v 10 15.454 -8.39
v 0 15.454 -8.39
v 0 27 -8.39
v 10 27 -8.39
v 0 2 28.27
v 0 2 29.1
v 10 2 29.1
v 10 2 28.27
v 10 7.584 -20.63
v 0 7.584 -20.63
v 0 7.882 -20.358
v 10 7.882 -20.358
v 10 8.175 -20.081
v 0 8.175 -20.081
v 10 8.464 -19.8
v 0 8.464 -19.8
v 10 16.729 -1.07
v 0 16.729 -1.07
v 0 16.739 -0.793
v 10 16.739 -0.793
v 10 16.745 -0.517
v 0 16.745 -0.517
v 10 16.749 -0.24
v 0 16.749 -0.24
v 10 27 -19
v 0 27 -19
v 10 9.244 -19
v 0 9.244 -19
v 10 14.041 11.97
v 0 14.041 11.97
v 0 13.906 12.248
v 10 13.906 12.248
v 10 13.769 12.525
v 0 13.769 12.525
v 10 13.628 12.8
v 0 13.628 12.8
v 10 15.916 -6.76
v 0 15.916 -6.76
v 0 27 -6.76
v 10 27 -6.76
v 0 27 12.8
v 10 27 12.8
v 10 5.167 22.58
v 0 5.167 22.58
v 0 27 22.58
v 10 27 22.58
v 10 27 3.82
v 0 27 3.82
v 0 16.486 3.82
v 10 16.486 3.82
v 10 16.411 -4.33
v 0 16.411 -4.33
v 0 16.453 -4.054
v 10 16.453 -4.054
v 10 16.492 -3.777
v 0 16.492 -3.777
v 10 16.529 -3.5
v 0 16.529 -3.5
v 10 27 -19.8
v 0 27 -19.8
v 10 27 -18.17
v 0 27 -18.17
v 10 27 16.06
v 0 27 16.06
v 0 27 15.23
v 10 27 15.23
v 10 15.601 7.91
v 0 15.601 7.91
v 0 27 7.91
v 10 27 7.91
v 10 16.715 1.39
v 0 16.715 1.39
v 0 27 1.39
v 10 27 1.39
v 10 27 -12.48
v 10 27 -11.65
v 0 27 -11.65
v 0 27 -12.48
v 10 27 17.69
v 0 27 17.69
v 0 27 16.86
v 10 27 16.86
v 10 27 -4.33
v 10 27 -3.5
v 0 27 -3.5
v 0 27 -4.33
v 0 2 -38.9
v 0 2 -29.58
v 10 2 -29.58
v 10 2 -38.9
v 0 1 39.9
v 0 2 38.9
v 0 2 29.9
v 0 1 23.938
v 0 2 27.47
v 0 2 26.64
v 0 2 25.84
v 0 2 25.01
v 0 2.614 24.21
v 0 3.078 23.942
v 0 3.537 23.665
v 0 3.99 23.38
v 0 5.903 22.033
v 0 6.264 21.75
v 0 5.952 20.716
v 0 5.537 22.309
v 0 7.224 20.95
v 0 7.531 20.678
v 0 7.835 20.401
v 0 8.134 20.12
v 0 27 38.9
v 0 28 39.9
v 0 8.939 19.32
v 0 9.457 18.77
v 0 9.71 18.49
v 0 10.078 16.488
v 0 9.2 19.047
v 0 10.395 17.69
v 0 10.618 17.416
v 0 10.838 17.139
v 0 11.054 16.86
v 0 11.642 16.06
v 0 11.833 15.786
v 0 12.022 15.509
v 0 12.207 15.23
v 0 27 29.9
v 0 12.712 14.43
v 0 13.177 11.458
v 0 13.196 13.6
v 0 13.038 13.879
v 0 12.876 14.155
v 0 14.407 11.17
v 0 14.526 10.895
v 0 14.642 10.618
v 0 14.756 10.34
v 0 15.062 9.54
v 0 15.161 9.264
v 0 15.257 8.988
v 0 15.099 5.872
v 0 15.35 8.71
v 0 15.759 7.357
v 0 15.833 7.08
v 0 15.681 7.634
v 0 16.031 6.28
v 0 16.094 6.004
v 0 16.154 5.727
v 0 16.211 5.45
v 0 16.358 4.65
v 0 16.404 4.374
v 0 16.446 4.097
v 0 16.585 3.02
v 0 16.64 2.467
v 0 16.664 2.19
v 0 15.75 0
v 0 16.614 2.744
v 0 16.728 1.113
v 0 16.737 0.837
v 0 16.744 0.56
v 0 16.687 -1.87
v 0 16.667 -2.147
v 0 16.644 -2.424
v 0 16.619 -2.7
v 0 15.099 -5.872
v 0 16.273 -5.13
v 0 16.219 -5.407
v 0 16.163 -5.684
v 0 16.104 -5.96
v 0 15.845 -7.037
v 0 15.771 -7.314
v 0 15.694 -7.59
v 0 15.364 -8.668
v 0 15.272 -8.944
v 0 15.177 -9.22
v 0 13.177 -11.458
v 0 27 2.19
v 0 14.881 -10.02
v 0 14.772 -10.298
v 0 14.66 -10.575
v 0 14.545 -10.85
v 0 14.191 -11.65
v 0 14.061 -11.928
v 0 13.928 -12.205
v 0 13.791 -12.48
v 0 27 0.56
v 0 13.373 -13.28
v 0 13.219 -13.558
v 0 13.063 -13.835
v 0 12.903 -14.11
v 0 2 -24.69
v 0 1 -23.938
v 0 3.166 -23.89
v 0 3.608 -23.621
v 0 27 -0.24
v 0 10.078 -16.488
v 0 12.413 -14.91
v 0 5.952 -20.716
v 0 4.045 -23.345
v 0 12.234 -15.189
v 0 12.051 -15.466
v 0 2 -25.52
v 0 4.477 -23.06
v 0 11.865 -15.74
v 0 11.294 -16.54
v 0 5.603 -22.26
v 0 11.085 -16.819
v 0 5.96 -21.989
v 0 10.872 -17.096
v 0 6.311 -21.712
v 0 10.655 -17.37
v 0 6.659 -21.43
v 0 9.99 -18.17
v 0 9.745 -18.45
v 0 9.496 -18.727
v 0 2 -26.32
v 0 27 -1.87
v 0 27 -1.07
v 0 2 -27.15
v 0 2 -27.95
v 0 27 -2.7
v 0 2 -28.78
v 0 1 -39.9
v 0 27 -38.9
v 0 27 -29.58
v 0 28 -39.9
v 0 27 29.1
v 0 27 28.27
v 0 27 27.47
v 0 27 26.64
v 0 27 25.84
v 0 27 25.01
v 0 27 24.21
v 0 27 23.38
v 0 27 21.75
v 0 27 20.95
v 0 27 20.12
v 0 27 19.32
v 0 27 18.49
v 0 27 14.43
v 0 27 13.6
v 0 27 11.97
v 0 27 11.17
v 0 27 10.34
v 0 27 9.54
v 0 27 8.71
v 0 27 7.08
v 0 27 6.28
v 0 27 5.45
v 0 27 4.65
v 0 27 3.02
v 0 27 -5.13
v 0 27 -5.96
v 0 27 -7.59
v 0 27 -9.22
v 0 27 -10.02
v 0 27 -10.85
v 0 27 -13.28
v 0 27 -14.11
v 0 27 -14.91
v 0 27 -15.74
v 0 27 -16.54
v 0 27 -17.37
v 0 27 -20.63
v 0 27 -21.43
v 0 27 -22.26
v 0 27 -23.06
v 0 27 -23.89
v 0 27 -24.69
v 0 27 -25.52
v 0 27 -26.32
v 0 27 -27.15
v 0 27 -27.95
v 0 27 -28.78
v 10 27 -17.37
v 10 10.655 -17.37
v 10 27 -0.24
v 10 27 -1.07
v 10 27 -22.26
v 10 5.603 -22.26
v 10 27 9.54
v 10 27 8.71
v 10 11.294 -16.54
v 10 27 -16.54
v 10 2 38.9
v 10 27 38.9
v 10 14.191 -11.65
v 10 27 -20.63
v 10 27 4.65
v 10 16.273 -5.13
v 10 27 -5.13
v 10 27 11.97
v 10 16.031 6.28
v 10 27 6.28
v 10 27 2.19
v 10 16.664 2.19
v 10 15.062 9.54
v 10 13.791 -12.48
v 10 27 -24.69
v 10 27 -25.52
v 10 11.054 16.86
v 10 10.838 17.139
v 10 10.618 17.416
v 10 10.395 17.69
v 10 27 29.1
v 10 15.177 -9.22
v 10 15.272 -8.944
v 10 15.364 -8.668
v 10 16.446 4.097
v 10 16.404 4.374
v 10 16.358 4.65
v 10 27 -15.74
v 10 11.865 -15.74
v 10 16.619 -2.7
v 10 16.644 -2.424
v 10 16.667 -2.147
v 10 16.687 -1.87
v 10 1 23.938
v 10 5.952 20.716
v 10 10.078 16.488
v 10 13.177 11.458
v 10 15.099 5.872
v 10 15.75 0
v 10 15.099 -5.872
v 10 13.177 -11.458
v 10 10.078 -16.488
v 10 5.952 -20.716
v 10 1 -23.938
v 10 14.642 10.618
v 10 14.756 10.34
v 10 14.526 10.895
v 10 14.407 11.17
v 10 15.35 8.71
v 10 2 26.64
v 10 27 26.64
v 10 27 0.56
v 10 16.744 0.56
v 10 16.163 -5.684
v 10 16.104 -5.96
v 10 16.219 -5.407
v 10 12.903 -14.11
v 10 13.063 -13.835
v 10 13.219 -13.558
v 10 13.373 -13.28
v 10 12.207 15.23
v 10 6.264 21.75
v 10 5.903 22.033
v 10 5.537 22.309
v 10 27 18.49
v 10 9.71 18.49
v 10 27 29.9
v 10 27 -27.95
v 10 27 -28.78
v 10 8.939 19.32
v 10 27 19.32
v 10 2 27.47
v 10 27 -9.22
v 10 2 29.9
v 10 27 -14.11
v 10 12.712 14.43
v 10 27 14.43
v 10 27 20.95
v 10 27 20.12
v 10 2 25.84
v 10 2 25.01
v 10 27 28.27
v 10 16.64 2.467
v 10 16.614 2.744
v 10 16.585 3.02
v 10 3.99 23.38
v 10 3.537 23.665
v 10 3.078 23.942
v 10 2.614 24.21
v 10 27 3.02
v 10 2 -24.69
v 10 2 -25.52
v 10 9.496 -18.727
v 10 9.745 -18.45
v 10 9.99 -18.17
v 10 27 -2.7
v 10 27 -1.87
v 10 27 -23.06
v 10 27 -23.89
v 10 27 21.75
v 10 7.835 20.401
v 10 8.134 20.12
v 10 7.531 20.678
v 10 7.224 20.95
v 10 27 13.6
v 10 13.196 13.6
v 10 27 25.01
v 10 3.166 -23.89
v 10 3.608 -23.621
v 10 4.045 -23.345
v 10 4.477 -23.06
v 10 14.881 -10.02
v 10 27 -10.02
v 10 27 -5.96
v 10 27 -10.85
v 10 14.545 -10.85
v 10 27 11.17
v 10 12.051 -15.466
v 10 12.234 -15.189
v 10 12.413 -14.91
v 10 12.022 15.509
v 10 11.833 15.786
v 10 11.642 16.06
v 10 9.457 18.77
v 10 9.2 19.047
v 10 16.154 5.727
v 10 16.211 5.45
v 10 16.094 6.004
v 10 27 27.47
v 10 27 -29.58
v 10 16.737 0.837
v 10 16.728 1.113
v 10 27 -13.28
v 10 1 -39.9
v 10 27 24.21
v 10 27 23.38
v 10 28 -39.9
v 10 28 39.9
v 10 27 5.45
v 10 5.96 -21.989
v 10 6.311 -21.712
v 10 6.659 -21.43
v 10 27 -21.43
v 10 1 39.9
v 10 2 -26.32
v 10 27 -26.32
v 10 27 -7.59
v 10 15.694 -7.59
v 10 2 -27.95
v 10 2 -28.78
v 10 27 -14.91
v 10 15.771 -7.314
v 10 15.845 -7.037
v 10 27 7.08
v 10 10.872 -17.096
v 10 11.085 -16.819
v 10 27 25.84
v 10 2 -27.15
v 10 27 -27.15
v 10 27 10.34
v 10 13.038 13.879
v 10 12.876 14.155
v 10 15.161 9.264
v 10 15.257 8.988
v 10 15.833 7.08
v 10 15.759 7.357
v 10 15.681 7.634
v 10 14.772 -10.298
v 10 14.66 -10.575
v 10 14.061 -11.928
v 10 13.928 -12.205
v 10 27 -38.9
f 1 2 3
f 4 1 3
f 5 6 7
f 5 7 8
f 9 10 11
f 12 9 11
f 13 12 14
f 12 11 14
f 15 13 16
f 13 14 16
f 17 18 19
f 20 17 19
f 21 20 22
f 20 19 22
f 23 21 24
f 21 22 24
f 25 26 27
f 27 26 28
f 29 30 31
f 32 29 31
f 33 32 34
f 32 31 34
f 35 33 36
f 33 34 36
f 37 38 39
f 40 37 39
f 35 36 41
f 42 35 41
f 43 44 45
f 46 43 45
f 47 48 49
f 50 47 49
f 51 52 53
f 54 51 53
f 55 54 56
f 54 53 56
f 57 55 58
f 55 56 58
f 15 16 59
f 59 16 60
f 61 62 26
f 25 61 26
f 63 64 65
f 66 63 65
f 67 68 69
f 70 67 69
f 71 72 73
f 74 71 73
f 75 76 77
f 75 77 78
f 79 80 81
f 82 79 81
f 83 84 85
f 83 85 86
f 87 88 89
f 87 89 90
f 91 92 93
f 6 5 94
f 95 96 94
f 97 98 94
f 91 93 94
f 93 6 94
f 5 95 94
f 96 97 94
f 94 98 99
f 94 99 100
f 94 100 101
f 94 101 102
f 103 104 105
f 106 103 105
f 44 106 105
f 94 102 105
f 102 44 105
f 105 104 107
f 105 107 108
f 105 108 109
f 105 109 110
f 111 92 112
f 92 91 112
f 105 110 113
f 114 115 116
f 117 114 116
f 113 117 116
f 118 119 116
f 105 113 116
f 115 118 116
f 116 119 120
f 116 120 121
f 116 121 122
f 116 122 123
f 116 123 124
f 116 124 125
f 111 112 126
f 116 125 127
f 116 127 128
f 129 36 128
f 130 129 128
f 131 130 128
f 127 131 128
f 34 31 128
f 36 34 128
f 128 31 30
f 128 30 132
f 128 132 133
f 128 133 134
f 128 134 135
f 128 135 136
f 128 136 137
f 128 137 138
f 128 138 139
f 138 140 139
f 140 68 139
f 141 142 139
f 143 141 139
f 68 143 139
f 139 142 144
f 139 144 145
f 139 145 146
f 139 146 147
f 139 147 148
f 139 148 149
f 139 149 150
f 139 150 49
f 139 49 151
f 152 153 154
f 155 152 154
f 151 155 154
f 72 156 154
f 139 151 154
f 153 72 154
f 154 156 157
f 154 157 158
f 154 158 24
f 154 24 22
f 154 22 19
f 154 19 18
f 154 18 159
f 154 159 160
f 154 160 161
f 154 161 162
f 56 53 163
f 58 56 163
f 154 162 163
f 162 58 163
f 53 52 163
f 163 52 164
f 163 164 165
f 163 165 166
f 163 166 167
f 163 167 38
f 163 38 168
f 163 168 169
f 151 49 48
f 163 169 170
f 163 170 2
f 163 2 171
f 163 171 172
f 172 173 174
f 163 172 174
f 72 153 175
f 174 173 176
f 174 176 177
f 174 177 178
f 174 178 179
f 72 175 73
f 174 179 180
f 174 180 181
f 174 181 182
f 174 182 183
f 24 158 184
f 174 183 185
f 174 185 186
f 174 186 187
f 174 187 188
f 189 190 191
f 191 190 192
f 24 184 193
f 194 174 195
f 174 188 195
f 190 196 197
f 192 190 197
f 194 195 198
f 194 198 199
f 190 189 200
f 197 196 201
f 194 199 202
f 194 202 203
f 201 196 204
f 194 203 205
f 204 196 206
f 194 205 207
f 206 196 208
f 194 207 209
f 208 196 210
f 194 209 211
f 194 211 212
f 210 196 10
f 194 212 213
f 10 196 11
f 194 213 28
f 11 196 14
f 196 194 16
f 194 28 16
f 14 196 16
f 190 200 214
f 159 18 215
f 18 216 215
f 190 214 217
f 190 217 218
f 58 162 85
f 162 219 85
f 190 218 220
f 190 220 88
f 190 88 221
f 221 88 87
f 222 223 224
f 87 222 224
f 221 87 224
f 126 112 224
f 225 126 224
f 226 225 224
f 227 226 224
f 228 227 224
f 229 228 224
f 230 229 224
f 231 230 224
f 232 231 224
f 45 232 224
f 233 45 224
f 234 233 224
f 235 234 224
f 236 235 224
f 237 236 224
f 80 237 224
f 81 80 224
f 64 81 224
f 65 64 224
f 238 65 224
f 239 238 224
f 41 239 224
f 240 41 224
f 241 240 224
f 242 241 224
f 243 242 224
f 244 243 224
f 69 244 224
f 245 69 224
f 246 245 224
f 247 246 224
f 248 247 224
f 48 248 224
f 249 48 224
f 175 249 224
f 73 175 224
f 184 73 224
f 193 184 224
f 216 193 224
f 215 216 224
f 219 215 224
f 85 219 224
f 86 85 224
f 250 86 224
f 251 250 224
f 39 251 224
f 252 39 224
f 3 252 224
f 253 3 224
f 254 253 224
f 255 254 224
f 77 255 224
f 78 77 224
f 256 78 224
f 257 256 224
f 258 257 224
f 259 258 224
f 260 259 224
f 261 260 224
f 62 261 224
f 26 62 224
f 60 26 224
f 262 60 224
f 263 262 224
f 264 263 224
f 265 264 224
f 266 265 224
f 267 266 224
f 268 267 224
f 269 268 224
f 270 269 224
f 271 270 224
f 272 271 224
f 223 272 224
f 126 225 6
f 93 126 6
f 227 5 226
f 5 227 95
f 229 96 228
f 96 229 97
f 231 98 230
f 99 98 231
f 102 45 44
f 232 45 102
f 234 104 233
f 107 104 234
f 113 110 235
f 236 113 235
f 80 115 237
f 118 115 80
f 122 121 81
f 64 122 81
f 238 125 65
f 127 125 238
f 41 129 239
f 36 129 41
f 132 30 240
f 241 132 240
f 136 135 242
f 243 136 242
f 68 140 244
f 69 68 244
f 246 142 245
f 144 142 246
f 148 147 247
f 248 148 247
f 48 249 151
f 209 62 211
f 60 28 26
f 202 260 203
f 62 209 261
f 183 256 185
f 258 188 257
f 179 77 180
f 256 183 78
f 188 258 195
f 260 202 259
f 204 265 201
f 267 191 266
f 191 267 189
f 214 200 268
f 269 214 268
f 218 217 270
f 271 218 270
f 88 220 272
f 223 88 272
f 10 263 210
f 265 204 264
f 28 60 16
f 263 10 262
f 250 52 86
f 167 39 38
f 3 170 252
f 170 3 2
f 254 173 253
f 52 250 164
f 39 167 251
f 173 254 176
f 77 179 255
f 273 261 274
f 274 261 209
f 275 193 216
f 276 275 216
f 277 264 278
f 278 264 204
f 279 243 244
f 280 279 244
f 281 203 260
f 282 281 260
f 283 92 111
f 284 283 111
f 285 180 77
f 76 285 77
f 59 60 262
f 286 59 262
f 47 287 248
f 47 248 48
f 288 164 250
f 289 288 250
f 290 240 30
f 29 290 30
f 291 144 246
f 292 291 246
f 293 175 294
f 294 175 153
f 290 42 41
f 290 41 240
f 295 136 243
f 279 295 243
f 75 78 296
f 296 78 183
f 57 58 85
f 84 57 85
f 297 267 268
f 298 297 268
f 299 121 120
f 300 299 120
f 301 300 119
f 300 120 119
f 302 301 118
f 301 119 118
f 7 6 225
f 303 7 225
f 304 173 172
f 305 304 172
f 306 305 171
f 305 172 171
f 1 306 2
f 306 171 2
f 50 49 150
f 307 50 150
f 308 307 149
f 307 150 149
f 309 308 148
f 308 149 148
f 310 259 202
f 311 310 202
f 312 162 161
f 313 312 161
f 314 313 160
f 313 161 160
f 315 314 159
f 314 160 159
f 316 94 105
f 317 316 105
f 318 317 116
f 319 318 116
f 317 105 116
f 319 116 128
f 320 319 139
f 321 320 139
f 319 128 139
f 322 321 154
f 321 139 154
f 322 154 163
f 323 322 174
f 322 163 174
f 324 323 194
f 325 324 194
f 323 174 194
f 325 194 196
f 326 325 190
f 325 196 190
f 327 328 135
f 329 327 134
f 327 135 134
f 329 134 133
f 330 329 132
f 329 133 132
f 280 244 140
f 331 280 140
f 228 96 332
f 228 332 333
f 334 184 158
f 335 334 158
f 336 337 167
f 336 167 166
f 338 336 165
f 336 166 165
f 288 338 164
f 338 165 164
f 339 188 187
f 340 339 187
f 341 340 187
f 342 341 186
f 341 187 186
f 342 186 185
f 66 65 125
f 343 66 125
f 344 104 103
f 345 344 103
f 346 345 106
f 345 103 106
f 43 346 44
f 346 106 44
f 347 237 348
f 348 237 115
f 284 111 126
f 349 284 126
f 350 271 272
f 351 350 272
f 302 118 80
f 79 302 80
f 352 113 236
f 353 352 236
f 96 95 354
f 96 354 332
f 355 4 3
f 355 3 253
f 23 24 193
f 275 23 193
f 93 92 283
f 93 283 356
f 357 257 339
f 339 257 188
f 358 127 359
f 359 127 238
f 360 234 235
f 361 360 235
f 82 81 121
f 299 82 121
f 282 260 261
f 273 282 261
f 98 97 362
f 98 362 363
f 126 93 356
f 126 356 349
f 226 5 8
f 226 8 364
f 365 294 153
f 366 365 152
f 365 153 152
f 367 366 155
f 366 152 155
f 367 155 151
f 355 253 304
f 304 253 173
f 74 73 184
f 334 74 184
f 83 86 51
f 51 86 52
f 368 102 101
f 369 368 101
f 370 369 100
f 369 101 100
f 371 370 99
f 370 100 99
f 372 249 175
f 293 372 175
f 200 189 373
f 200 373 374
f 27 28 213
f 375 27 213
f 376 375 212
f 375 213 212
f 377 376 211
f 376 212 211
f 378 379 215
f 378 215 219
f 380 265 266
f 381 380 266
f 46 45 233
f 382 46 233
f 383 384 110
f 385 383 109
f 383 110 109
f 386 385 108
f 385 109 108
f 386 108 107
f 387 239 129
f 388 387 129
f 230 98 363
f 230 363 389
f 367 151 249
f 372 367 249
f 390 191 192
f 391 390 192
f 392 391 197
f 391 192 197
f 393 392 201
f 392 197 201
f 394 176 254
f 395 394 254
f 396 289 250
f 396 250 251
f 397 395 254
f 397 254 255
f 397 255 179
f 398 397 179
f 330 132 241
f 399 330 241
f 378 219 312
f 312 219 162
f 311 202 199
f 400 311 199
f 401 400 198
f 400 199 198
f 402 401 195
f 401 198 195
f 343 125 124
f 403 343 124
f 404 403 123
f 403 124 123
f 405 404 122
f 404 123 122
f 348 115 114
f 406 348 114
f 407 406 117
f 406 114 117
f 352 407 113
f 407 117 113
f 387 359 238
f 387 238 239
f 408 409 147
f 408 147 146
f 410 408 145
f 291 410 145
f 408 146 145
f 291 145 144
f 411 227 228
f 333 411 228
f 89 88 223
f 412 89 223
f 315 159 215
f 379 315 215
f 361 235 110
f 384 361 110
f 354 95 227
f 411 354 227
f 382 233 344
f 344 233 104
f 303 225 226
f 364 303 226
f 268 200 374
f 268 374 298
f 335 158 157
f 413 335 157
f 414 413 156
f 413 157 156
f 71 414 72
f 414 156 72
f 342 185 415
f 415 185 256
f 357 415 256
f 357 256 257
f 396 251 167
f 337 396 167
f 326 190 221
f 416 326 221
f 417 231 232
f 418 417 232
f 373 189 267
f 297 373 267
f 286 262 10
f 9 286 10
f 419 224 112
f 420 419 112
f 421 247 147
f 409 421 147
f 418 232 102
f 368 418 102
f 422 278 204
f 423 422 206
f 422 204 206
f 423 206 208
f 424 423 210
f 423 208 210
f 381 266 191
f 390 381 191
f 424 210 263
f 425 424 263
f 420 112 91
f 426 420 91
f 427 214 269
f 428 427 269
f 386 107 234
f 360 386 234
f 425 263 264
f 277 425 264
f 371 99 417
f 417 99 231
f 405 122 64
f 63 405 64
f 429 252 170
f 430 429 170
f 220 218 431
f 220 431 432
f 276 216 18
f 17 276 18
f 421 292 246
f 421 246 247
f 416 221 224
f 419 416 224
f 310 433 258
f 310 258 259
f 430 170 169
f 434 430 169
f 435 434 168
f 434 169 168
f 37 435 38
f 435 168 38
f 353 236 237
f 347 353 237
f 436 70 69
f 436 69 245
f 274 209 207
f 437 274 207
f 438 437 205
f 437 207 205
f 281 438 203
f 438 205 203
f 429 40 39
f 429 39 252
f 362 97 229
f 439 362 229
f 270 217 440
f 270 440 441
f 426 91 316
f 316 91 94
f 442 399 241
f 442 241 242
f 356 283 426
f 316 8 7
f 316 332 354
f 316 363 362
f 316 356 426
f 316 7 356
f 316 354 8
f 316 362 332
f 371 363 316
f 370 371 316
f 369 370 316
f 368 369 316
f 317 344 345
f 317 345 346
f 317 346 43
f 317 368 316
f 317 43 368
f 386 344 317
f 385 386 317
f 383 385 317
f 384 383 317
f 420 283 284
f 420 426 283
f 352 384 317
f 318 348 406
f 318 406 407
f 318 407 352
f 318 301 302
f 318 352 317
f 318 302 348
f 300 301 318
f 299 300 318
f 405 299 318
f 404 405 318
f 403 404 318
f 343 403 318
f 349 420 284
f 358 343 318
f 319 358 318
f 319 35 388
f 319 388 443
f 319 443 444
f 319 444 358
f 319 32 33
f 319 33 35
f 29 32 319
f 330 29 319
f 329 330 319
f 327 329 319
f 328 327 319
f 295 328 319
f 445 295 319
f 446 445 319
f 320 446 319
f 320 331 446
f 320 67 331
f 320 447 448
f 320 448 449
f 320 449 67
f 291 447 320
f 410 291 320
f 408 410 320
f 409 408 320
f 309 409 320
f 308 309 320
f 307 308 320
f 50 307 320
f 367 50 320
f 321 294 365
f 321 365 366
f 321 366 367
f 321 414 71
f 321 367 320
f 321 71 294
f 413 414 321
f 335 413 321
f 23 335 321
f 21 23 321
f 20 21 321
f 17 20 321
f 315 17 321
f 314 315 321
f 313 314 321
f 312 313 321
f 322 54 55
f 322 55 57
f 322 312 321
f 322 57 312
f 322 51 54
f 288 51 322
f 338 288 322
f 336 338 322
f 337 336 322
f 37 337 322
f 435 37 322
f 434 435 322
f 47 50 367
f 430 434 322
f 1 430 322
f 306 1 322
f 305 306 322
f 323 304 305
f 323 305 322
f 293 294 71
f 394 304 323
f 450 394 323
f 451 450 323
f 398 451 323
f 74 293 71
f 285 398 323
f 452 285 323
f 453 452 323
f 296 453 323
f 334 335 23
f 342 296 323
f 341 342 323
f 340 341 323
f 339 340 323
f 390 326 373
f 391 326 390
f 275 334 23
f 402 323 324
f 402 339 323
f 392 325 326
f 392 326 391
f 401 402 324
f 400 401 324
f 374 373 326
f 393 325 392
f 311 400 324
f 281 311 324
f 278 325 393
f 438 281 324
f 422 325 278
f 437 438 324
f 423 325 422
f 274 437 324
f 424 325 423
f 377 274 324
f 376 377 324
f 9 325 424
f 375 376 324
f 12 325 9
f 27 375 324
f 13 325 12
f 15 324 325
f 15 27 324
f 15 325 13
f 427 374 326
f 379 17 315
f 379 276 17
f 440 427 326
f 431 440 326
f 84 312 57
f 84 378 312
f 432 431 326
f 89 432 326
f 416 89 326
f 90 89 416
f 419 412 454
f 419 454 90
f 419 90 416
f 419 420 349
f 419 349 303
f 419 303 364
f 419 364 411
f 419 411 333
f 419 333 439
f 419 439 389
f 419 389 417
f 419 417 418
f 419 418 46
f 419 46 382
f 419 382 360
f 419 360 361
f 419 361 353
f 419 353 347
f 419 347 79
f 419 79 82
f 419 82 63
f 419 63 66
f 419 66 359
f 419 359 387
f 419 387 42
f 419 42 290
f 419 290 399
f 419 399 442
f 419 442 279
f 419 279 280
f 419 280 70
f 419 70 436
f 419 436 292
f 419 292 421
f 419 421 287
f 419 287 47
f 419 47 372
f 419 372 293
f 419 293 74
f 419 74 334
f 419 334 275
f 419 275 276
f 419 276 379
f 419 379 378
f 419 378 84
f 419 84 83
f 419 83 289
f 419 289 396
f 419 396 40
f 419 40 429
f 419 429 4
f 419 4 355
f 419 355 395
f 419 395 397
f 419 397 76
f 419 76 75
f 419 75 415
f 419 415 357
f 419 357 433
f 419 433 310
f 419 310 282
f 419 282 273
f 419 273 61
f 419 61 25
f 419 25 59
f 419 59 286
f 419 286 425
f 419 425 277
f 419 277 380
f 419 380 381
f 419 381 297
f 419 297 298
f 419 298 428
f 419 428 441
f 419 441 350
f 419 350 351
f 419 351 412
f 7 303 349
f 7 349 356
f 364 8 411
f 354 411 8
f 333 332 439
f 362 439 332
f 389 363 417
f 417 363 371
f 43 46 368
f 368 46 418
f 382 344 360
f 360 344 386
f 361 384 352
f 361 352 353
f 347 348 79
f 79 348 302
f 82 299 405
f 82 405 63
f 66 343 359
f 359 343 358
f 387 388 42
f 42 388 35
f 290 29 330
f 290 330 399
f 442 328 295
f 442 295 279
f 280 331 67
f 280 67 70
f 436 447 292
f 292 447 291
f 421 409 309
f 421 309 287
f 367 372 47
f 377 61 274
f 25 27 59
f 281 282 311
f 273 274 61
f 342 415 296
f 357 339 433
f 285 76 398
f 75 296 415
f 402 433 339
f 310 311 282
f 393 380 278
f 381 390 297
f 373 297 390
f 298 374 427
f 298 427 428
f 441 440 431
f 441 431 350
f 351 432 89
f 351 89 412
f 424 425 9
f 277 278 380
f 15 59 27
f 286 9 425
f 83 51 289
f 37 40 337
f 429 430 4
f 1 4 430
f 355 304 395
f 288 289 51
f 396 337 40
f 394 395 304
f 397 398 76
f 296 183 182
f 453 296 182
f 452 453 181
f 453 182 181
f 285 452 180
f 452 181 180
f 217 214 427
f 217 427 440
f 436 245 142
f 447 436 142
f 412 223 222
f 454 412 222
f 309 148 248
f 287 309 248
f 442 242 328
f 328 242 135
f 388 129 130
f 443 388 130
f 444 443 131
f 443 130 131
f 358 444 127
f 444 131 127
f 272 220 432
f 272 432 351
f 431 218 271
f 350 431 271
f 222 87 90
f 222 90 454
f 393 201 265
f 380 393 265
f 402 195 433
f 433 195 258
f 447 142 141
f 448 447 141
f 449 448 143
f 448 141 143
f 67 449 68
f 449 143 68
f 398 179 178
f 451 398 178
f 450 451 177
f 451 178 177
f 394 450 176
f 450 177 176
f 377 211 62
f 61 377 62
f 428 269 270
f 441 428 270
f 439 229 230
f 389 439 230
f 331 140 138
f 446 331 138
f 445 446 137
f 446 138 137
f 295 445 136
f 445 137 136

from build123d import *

# Parameters (mm, degrees)
SKETCH1_W           = 9
SKETCH1_H           = 25
SKETCH1_W_2         = 0.83
SKETCH1_W_3         = 9.32
BOSS_EXTRUDE1_DEPTH = 10


with BuildPart() as part:
    # Sketch1 → Boss-Extrude1 (new body)
    with BuildSketch(Plane(origin=(0, 0, 0), x_dir=(0, 0, -1), z_dir=(1, 0, 0))):
        with BuildLine():
            Line((23.938201687, 1), (39.9, 1))
            Line((39.9, 1), (39.9, 28))
            Line((39.9, 28), (-39.9, 28))
            Line((-39.9, 28), (-39.9, 1))
            Line((-39.9, 1), (-23.938201687, 1))
            ThreePointArc((-23.938201687, 1), (0, 15.75), (23.938201687, 1))
        make_face()
        with Locations((-34.4, 14.5)):
            Rectangle(SKETCH1_W, SKETCH1_H, mode=Mode.SUBTRACT)
        with Locations((-28.685, 14.5)):
            Rectangle(SKETCH1_W_2, SKETCH1_H, mode=Mode.SUBTRACT)
        with Locations((-27.055, 14.5)):
            Rectangle(SKETCH1_W_2, SKETCH1_H, mode=Mode.SUBTRACT)
        with Locations((-25.425, 14.5)):
            Rectangle(SKETCH1_W_2, SKETCH1_H, mode=Mode.SUBTRACT)
        with BuildLine():
            Line((-24.21, 27), (-23.38, 27))
            Line((-23.38, 27), (-23.38, 3.990465418))
            ThreePointArc((-23.38, 3.990465418), (-23.80494512, 3.308432638), (-24.21, 2.614402658))
            Line((-24.21, 2.614402658), (-24.21, 27))
        make_face(mode=Mode.SUBTRACT)
        with BuildLine():
            Line((-22.58, 27), (-21.75, 27))
            Line((-21.75, 27), (-21.75, 6.264083863))
            ThreePointArc((-21.75, 6.264083863), (-22.171789507, 5.720562008), (-22.58, 5.166769099))
            Line((-22.58, 5.166769099), (-22.58, 27))
        make_face(mode=Mode.SUBTRACT)
        with BuildLine():
            Line((-20.95, 27), (-20.12, 27))
            Line((-20.12, 27), (-20.12, 8.133993328))
            ThreePointArc((-20.12, 8.133993328), (-20.540040569, 7.683572361), (-20.95, 7.223956879))
            Line((-20.95, 7.223956879), (-20.95, 27))
        make_face(mode=Mode.SUBTRACT)
        with BuildLine():
            Line((-19.32, 27), (-18.49, 27))
            Line((-18.49, 27), (-18.49, 9.709573695))
            ThreePointArc((-18.49, 9.709573695), (-18.908921242, 9.328731498), (-19.32, 8.939437211))
            Line((-19.32, 8.939437211), (-19.32, 27))
        make_face(mode=Mode.SUBTRACT)
        with BuildLine():
            Line((-17.69, 27), (-16.86, 27))
            Line((-16.86, 27), (-16.86, 11.053854867))
            ThreePointArc((-16.86, 11.053854867), (-17.278137213, 10.72856686), (-17.69, 10.39537013))
            Line((-17.69, 10.39537013), (-17.69, 27))
        make_face(mode=Mode.SUBTRACT)
        with BuildLine():
            Line((-16.06, 27), (-15.23, 27))
            Line((-15.23, 27), (-15.23, 12.206979598))
            ThreePointArc((-15.23, 12.206979598), (-15.647552225, 11.928122407), (-16.06, 11.641769433))
            Line((-16.06, 11.641769433), (-16.06, 27))
        make_face(mode=Mode.SUBTRACT)
        with BuildLine():
            Line((-14.43, 27), (-13.6, 27))
            Line((-13.6, 27), (-13.6, 13.196236821))
            ThreePointArc((-13.6, 13.196236821), (-14.017094411, 12.957520994), (-14.43, 12.711630836))
            Line((-14.43, 12.711630836), (-14.43, 27))
        make_face(mode=Mode.SUBTRACT)
        with BuildLine():
            Line((-12.8, 27), (-11.97, 27))
            Line((-11.97, 27), (-11.97, 14.041016321))
            ThreePointArc((-11.97, 14.041016321), (-12.386722167, 13.83793109), (-12.8, 13.627925359))
            Line((-12.8, 13.627925359), (-12.8, 27))
        make_face(mode=Mode.SUBTRACT)
        with BuildLine():
            Line((-11.17, 27), (-10.34, 27))
            Line((-10.34, 27), (-10.34, 14.755511039))
            ThreePointArc((-10.34, 14.755511039), (-10.756409627, 14.584735262), (-11.17, 14.40724062))
            Line((-11.17, 14.40724062), (-11.17, 27))
        make_face(mode=Mode.SUBTRACT)
        with BuildLine():
            Line((-9.54, 27), (-8.71, 27))
            Line((-8.71, 27), (-8.71, 15.350301135))
            ThreePointArc((-8.71, 15.350301135), (-9.126139757, 15.209352108), (-9.54, 15.061844056))
            Line((-9.54, 15.061844056), (-9.54, 27))
        make_face(mode=Mode.SUBTRACT)
        with BuildLine():
            Line((-7.91, 27), (-7.08, 27))
            Line((-7.08, 27), (-7.08, 15.833333127))
            ThreePointArc((-7.08, 15.833333127), (-7.495900758, 15.720346875), (-7.91, 15.600926813))
            Line((-7.91, 15.600926813), (-7.91, 27))
        make_face(mode=Mode.SUBTRACT)
        with BuildLine():
            Line((-6.28, 27), (-5.45, 27))
            Line((-5.45, 27), (-5.45, 16.210548417))
            ThreePointArc((-5.45, 16.210548417), (-5.865684067, 16.124137529), (-6.28, 16.031388443))
            Line((-6.28, 16.031388443), (-6.28, 27))
        make_face(mode=Mode.SUBTRACT)
        with BuildLine():
            Line((-4.65, 27), (-3.82, 27))
            Line((-3.82, 27), (-3.82, 16.486296047))
            ThreePointArc((-3.82, 16.486296047), (-4.235483175, 16.425455998), (-4.65, 16.358347269))
            Line((-4.65, 16.358347269), (-4.65, 27))
        make_face(mode=Mode.SUBTRACT)
        with BuildLine():
            Line((-3.02, 27), (-2.19, 27))
            Line((-2.19, 27), (-2.19, 16.663604962))
            ThreePointArc((-2.19, 16.663604962), (-2.605292879, 16.62765252), (-3.02, 16.585477199))
            Line((-3.02, 16.585477199), (-3.02, 27))
        make_face(mode=Mode.SUBTRACT)
        with BuildLine():
            Line((-1.39, 27), (-0.56, 27))
            Line((-0.56, 27), (-0.56, 16.74435914))
            ThreePointArc((-0.56, 16.74435914), (-0.97510879, 16.732893349), (-1.39, 16.715228254))
            Line((-1.39, 16.715228254), (-1.39, 27))
        make_face(mode=Mode.SUBTRACT)
        with BuildLine():
            Line((0.24, 27), (1.07, 27))
            Line((1.07, 27), (1.07, 16.729400641))
            ThreePointArc((1.07, 16.729400641), (0.655073035, 16.74228093), (0.24, 16.748964009))
            Line((0.24, 16.748964009), (0.24, 27))
        make_face(mode=Mode.SUBTRACT)
        with BuildLine():
            Line((1.87, 27), (2.7, 27))
            Line((2.7, 27), (2.7, 16.618574231))
            ThreePointArc((2.7, 16.618574231), (2.285256378, 16.655912786), (1.87, 16.687034809))
            Line((1.87, 16.687034809), (1.87, 27))
        make_face(mode=Mode.SUBTRACT)
        with BuildLine():
            Line((3.5, 27), (4.33, 27))
            Line((4.33, 27), (4.33, 16.410719219))
            ThreePointArc((4.33, 16.410719219), (3.915445127, 16.472886648), (3.5, 16.528796203))
            Line((3.5, 16.528796203), (3.5, 27))
        make_face(mode=Mode.SUBTRACT)
        with BuildLine():
            Line((5.13, 27), (5.96, 27))
            Line((5.96, 27), (5.96, 16.103607495))
            ThreePointArc((5.96, 16.103607495), (5.54564356, 16.191252495), (5.13, 16.272574915))
            Line((5.13, 16.272574915), (5.13, 27))
        make_face(mode=Mode.SUBTRACT)
        with BuildLine():
            Line((6.76, 27), (7.59, 27))
            Line((7.59, 27), (7.59, 15.693819847))
            ThreePointArc((7.59, 15.693819847), (7.175856686, 15.807905369), (6.76, 15.915578058))
            Line((6.76, 15.915578058), (6.76, 27))
        make_face(mode=Mode.SUBTRACT)
        with BuildLine():
            Line((8.39, 27), (9.22, 27))
            Line((9.22, 27), (9.22, 15.176543806))
            ThreePointArc((9.22, 15.176543806), (8.806090708, 15.3184047), (8.39, 15.453733699))
            Line((8.39, 15.453733699), (8.39, 27))
        make_face(mode=Mode.SUBTRACT)
        with BuildLine():
            Line((10.02, 27), (10.85, 27))
            Line((10.85, 27), (10.85, 14.545263234))
            ThreePointArc((10.85, 14.545263234), (10.43635371, 14.71669403), (10.02, 14.881440377))
            Line((10.02, 14.881440377), (10.02, 27))
        make_face(mode=Mode.SUBTRACT)
        with BuildLine():
            Line((11.65, 27), (12.48, 27))
            Line((12.48, 27), (12.48, 13.791288211))
            ThreePointArc((12.48, 13.791288211), (12.066656732, 13.994675988), (11.65, 14.191186581))
            Line((11.65, 14.191186581), (11.65, 27))
        make_face(mode=Mode.SUBTRACT)
        with BuildLine():
            Line((13.28, 27), (14.11, 27))
            Line((14.11, 27), (14.11, 12.903035298))
            ThreePointArc((14.11, 12.903035298), (13.697015562, 13.141563916), (13.28, 13.372972792))
            Line((13.28, 13.372972792), (13.28, 27))
        make_face(mode=Mode.SUBTRACT)
        with BuildLine():
            Line((14.91, 27), (15.74, 27))
            Line((15.74, 27), (15.74, 11.864894719))
            ThreePointArc((15.74, 11.864894719), (15.327453929, 12.142868646), (14.91, 12.413416205))
            Line((14.91, 12.413416205), (14.91, 27))
        make_face(mode=Mode.SUBTRACT)
        with BuildLine():
            Line((16.54, 27), (17.37, 27))
            Line((17.37, 27), (17.37, 10.655370303))
            ThreePointArc((17.37, 10.655370303), (16.958009538, 10.978751951), (16.54, 11.294314713))
            Line((16.54, 11.294314713), (16.54, 27))
        make_face(mode=Mode.SUBTRACT)
        with BuildLine():
            Line((18.17, 27), (19, 27))
            Line((19, 27), (19, 9.24384143))
            ThreePointArc((19, 9.24384143), (18.588746526, 9.621199835), (18.17, 9.990225759))
            Line((18.17, 9.990225759), (18.17, 27))
        make_face(mode=Mode.SUBTRACT)
        with BuildLine():
            Line((19.8, 27), (20.63, 27))
            Line((20.63, 27), (20.63, 7.584460014))
            ThreePointArc((20.63, 7.584460014), (20.219784013, 8.028792794), (19.8, 8.464097468))
            Line((19.8, 8.464097468), (19.8, 27))
        make_face(mode=Mode.SUBTRACT)
        with BuildLine():
            Line((21.43, 27), (22.26, 27))
            Line((22.26, 27), (22.26, 5.603299973))
            ThreePointArc((22.26, 5.603299973), (21.851371771, 6.135969619), (21.43, 6.658616547))
            Line((21.43, 6.658616547), (21.43, 27))
        make_face(mode=Mode.SUBTRACT)
        with BuildLine():
            Line((23.06, 27), (23.89, 27))
            Line((23.89, 27), (23.89, 3.166465806))
            ThreePointArc((23.89, 3.166465806), (23.484138497, 3.827339784), (23.06, 4.47663518))
            Line((23.06, 4.47663518), (23.06, 27))
        make_face(mode=Mode.SUBTRACT)
        with Locations((25.105, 14.5)):
            Rectangle(SKETCH1_W_2, SKETCH1_H, mode=Mode.SUBTRACT)
        with Locations((26.735, 14.5)):
            Rectangle(SKETCH1_W_2, SKETCH1_H, mode=Mode.SUBTRACT)
        with Locations((28.365, 14.5)):
            Rectangle(SKETCH1_W_2, SKETCH1_H, mode=Mode.SUBTRACT)
        with Locations((34.24, 14.5)):
            Rectangle(SKETCH1_W_3, SKETCH1_H, mode=Mode.SUBTRACT)
    extrude(amount=BOSS_EXTRUDE1_DEPTH)


solid = part.part
